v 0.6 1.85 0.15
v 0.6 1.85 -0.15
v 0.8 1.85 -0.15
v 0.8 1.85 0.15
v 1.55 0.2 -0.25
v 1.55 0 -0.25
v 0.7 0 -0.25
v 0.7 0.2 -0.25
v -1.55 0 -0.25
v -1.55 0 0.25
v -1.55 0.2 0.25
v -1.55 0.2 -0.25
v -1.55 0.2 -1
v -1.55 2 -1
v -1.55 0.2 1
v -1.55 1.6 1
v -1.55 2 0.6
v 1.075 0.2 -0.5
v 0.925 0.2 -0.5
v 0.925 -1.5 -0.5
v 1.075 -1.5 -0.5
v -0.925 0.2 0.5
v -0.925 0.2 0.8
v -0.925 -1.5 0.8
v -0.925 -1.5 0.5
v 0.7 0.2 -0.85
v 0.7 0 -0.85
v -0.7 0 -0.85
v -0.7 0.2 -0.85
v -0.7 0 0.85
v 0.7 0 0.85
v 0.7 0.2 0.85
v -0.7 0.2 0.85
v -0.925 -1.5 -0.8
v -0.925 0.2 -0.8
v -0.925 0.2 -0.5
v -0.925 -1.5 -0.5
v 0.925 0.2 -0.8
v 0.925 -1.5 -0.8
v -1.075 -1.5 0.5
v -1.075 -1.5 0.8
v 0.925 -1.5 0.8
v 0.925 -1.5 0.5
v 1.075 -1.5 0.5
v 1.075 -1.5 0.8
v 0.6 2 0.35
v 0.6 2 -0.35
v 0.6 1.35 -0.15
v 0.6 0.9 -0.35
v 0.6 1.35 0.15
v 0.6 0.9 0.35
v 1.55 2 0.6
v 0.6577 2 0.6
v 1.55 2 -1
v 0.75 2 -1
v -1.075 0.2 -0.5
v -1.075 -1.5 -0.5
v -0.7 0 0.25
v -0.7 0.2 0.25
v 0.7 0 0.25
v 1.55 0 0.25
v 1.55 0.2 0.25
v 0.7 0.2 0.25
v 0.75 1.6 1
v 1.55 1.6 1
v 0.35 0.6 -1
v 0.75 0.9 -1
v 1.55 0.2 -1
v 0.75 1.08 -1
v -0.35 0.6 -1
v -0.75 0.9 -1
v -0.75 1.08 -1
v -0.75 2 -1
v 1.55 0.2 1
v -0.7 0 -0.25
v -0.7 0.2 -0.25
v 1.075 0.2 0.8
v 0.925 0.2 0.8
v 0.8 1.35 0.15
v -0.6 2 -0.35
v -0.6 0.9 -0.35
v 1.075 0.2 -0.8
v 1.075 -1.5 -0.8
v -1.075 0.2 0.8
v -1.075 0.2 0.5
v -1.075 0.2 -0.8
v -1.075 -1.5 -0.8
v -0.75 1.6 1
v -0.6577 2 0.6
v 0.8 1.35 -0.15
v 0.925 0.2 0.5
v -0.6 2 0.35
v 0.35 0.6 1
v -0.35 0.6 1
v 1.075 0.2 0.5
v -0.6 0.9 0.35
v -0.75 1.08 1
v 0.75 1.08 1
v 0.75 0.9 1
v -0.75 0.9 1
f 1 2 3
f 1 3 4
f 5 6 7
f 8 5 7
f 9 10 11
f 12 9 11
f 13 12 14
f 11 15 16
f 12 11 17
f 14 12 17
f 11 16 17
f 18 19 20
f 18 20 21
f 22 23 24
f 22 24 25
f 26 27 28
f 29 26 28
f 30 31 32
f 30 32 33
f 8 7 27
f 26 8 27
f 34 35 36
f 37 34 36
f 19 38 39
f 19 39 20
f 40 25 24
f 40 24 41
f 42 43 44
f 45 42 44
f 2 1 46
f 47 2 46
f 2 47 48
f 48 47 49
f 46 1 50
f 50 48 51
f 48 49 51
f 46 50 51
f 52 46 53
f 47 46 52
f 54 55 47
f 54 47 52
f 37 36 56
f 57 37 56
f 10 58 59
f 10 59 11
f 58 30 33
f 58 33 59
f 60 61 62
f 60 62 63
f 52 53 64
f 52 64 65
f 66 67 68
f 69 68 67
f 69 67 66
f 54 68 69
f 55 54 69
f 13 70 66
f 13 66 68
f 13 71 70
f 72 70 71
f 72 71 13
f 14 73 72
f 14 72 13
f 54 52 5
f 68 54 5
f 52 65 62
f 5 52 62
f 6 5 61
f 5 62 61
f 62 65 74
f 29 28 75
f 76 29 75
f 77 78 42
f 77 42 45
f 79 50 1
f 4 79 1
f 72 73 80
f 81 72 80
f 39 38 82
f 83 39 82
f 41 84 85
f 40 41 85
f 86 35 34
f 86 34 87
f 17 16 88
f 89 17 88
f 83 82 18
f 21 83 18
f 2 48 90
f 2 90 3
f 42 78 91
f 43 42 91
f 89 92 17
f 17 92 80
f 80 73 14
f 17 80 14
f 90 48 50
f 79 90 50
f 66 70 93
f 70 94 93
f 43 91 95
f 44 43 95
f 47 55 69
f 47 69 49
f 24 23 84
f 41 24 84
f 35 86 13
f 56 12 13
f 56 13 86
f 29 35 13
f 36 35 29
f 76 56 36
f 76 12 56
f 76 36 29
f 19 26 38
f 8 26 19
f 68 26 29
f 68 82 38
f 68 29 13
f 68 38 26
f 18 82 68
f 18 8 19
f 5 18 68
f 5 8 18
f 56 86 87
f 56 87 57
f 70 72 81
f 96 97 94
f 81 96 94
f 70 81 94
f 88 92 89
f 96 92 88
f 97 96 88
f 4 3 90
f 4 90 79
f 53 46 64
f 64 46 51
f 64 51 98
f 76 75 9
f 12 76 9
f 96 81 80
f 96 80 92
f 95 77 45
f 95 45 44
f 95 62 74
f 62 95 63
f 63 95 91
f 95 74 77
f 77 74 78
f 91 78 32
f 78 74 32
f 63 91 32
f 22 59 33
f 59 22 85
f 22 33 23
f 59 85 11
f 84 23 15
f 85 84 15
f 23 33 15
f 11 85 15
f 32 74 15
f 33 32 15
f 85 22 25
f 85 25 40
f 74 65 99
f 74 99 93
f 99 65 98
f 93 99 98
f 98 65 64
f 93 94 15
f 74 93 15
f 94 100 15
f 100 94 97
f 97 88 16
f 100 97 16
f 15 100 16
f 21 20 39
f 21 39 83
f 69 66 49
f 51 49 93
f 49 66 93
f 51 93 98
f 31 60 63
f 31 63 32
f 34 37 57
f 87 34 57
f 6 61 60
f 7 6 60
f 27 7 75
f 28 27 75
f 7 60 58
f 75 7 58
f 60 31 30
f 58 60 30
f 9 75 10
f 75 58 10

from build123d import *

# Parameters (mm, degrees)
BOSS_EXTRUDE1_DEPTH     = 1
BOSS_EXTRUDE2_START     = -1.1
BOSS_EXTRUDE2_DEPTH     = 1.1
CHAMFER1_SIZE           = 0.4
CUT_EXTRUDE1_DEPTH      = 0.2
SKETCH4_W               = 0.3
SKETCH4_H               = 0.5
CUT_EXTRUDE2_DEPTH      = 0.2
SKETCH5_W               = 0.15
SKETCH5_H               = 0.3
BOSS_EXTRUDE3_DEPTH     = 1.7
MIRROR3_COPY_1_SKETCH_W = 0.15
MIRROR3_COPY_1_SKETCH_H = 0.3
MIRROR3_COPY_1_DEPTH    = 1.7


with BuildPart() as part:
    # Sketch1 → Boss-Extrude1 (new body, symmetric)
    with BuildSketch(Plane.XY):
        Polygon((-0.75, 2), (-0.75, 1.08), (-0.35, 0.6), (0.35, 0.6), (0.75, 1.08), (0.75, 2), (1.55, 2), (1.55, 0), (-1.55, 0), (-1.55, 2), align=None)
    extrude(amount=BOSS_EXTRUDE1_DEPTH, both=True)

    # Sketch2 → Boss-Extrude2 (add)
    with BuildSketch(Plane(origin=(0, 2, 0), x_dir=(1, 0, 0), z_dir=(0, 1, 0)).offset(BOSS_EXTRUDE2_START)):
        Polygon((0.75, 1), (0.6, 0.35), (0.6, -0.35), (0.75, -1), align=None)
    boss_extrude2 = extrude(amount=BOSS_EXTRUDE2_DEPTH)

    # Mirror1: Boss-Extrude2 across plane
    add(boss_extrude2.mirror(Plane(origin=(0, 0, 0), x_dir=(0, 0, 1), z_dir=(1, 0, 0))))

    # Chamfer1
    chamfer1_edges = [part.edges().sort_by_distance(p)[0] for p in [
        (1.15, 2, 1),
        (-1.15, 2, 1),
    ]]
    chamfer(chamfer1_edges, length=CHAMFER1_SIZE)

    # Sketch3 → Cut-Extrude1 (cut)
    with BuildSketch(Plane.XZ):
        Polygon((-0.7, -0.25), (-1.55, -0.25), (-1.55, -1), (1.55, -1), (1.55, -0.25), (0.7, -0.25), (0.7, -0.85), (-0.7, -0.85), align=None)
        Polygon((-1.55, 1), (1.55, 1), (1.55, 0.25), (0.7, 0.25), (0.7, 0.85), (-0.7, 0.85), (-0.7, 0.25), (-1.55, 0.25), align=None)
    extrude(amount=-CUT_EXTRUDE1_DEPTH, mode=Mode.SUBTRACT)

    # Sketch4 → Cut-Extrude2 (cut)
    with BuildSketch(Plane.ZY.offset(-0.6)):
        with Locations((0, 1.6)):
            Rectangle(SKETCH4_W, SKETCH4_H)
    extrude(amount=-CUT_EXTRUDE2_DEPTH, mode=Mode.SUBTRACT)

    # Sketch5 → Boss-Extrude3 (add)
    with BuildSketch(Plane.XZ.offset(-0.2)):
        with Locations((1, -0.65)):
            Rectangle(SKETCH5_W, SKETCH5_H)
    boss_extrude3 = extrude(amount=BOSS_EXTRUDE3_DEPTH)

    # Mirror2: Boss-Extrude3 across plane
    add(boss_extrude3.mirror(Plane.XY))

    # Mirror3: Boss-Extrude3 across plane
    add(boss_extrude3.mirror(Plane(origin=(0, 0, 0), x_dir=(0, 0, 1), z_dir=(1, 0, 0))))

    # Mirror3 copy 1 sketch → Mirror3 copy 1 (add)
    with BuildSketch(Plane(origin=(0, 0.2, 0), x_dir=(-1, 0, 0), z_dir=(0, -1, 0))):
        with Locations((1, -0.65)):
            Rectangle(MIRROR3_COPY_1_SKETCH_W, MIRROR3_COPY_1_SKETCH_H)
    extrude(amount=MIRROR3_COPY_1_DEPTH)


solid = part.part
